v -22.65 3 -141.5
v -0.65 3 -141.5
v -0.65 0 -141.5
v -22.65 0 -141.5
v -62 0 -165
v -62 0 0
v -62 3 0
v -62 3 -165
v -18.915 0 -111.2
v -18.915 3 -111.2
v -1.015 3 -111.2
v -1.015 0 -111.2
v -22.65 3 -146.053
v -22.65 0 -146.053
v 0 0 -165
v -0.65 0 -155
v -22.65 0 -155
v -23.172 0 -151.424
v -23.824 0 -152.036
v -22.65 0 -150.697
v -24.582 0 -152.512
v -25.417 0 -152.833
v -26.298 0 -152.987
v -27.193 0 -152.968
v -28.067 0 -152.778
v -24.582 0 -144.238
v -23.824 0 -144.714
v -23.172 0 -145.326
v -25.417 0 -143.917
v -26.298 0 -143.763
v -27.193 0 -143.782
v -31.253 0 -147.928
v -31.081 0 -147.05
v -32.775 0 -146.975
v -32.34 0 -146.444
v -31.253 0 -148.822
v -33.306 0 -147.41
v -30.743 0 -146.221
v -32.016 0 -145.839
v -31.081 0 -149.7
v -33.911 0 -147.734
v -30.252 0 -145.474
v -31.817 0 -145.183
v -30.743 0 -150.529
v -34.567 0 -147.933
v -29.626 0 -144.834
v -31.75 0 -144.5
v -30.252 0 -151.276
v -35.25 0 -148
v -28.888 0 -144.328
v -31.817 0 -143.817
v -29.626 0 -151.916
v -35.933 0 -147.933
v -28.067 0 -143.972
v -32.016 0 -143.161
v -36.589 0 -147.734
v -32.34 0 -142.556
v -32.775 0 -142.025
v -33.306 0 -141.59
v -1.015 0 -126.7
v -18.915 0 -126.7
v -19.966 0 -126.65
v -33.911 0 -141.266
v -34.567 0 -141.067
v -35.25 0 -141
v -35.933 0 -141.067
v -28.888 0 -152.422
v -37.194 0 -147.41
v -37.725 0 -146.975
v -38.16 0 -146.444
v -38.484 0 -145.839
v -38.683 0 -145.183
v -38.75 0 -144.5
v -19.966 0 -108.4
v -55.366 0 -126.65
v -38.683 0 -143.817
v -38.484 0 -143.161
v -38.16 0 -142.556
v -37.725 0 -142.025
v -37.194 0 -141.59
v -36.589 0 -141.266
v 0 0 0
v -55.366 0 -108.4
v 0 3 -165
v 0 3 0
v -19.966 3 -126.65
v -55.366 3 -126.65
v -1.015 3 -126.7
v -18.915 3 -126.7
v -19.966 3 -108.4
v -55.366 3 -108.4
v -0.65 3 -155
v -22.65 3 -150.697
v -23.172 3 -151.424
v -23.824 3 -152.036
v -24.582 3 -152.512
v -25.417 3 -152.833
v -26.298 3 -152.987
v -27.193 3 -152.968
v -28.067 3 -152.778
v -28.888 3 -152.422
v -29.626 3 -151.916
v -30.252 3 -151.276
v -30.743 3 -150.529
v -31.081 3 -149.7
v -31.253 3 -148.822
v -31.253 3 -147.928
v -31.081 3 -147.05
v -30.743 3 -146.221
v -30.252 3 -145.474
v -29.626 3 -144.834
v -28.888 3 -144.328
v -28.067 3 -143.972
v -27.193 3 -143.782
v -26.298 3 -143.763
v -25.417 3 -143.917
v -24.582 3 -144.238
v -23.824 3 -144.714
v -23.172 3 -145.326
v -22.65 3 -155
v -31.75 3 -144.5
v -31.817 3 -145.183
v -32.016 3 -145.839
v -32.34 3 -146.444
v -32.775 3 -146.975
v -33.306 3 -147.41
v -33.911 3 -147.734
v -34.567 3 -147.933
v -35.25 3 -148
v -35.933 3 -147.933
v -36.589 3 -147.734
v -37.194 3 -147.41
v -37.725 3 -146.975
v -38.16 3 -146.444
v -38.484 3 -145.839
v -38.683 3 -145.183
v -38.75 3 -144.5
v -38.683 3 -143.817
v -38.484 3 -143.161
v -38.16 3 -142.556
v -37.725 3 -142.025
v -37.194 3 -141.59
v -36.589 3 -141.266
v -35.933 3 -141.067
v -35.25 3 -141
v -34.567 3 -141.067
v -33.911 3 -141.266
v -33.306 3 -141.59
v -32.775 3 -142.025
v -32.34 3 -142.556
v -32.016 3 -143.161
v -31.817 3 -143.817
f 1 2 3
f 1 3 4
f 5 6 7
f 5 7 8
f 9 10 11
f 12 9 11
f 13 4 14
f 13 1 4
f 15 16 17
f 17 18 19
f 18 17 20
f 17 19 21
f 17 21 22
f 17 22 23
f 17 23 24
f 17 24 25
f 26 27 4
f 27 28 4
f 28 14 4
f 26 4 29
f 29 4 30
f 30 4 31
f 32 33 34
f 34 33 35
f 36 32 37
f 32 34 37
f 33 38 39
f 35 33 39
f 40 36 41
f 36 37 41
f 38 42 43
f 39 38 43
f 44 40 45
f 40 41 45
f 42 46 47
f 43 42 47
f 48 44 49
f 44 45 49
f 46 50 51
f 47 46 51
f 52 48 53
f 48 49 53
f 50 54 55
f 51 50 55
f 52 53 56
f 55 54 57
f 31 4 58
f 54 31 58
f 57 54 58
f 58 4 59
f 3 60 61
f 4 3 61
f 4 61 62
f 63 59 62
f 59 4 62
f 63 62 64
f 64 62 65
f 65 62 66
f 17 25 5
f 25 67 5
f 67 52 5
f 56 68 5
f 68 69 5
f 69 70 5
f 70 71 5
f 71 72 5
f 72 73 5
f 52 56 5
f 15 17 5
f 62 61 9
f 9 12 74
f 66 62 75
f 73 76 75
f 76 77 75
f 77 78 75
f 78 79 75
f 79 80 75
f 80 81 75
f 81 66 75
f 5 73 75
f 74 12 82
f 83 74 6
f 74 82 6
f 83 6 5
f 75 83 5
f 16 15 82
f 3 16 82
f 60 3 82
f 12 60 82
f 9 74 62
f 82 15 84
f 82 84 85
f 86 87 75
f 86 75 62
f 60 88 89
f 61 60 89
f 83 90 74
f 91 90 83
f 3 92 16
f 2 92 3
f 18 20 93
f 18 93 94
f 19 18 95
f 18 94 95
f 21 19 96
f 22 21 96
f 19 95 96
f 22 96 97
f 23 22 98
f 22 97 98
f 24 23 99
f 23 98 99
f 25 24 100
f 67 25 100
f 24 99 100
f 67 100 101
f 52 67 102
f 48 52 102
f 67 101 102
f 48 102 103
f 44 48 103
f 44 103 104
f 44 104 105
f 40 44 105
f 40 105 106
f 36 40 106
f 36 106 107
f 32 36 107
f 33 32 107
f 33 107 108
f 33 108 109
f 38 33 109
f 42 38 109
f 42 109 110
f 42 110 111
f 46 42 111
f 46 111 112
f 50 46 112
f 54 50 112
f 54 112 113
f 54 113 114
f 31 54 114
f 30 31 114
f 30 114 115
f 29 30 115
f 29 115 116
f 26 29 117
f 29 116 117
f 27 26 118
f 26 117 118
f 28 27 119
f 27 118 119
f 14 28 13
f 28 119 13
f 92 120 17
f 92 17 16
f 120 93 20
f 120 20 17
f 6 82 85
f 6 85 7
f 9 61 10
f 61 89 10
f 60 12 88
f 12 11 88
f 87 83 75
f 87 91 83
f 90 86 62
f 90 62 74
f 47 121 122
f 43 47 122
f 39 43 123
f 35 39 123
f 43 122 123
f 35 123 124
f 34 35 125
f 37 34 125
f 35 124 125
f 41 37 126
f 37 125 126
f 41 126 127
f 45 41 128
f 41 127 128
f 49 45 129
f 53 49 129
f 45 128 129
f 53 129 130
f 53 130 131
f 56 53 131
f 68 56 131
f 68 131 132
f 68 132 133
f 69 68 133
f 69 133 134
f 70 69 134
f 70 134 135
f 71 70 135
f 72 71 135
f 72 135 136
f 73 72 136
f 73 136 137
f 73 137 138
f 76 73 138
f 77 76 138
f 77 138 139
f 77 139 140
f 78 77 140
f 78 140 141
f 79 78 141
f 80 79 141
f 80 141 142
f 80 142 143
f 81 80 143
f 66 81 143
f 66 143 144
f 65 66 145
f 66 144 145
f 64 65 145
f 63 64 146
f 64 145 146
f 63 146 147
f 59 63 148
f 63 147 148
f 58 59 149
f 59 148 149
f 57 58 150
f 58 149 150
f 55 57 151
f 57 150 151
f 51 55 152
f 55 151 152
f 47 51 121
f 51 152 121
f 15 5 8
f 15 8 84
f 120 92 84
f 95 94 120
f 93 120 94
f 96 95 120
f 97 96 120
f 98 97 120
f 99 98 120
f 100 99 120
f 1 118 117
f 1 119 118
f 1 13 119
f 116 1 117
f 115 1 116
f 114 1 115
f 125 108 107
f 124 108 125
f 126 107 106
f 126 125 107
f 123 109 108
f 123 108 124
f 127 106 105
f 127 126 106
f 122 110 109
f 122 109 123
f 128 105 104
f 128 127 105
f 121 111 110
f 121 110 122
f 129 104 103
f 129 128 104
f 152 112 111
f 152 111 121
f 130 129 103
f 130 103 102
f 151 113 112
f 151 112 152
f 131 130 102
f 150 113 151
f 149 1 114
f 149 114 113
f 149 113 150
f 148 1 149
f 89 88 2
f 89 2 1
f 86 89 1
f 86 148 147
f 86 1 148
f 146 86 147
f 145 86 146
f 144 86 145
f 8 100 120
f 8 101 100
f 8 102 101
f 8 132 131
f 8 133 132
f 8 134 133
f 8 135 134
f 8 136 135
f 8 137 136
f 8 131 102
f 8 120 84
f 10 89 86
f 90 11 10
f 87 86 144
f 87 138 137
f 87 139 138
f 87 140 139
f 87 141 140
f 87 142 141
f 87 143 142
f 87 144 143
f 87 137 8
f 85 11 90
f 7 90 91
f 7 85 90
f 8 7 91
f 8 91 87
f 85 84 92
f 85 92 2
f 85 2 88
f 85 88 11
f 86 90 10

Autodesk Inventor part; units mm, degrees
ref_plane "YZ Plane" through (0, 0, 0) normal (1, 0, 0) x (0, 1, 0)
ref_plane "XZ Plane" through (0, 0, 0) normal (0, 1, 0) x (-1, 0, 0)
ref_plane "XY Plane" through (0, 0, 0) normal (0, 0, 1) x (1, 0, 0)
sketch "Sketch1" plane through (0, 0, 0) normal (0, 1, 0) x (-1, 0, 0)
  line L0 (0, 0) -> (62, 0)
  line L1 (62, 0) -> (62, -165)
  line L2 (62, -165) -> (0, -165)
  line L3 (0, -165) -> (0, 0)
  dimension "d0" = 165
  dimension "d1" = 62
extrude "Extrusion1" add sketch "Sketch1" along normal blind 3
sketch "Sketch2" plane through (0, 3, 0) normal (0, 1, 0) x (1, 0, 0)
  line L0 (-62, 165) -> (-62, 0)
  line L1 (3, 165) -> (-127, 165)
  circle A0 centre (-26.65, 148.375) radius 3.125
  line L2 (-18.9147, 111.2) -> (-1.0147, 111.2)
  line L3 (-1.0147, 111.2) -> (-1.0147, 126.7)
  line L4 (-1.0147, 126.7) -> (-18.9147, 126.7)
  line L5 (-18.9147, 126.7) -> (-18.9147, 111.2)
  line L6 (-17.6147, 112.2) -> (-2.3147, 112.2)
  line L7 (-7.804, 125.7) -> (-2.9647, 125.7)
  line L8 (-2.0147, 125.4) -> (-2.0147, 112.5)
  line L9 (-17.9147, 112.5) -> (-17.9147, 125.4)
  line L10 (-19.9657, 108.4) -> (-55.3657, 108.4)
  line L11 (-55.3657, 108.4) -> (-55.3657, 126.65)
  line L12 (-55.3657, 126.65) -> (-19.9657, 126.65)
  line L13 (-19.9657, 126.65) -> (-19.9657, 108.4)
  line L14 (-33.4157, 109.4) -> (-23.5157, 109.4)
  line L15 (-51.8157, 109.4) -> (-41.9157, 109.4)
  line L16 (-54.3657, 123.1) -> (-54.3657, 111.95)
  line L17 (-46.9157, 125.65) -> (-51.8157, 125.65)
  line L18 (-23.5157, 125.65) -> (-28.4157, 125.65)
  line L19 (-20.9657, 111.95) -> (-20.9657, 123.1)
  circle A1 centre (-26.65, 148.375) radius 4.625
  circle A2 centre (-35.25, 144.5) radius 3.5
  circle A3 centre (-35.25, 144.5) radius 2.5
  line L20 (-0.65, 141.5) -> (-22.65, 141.5)
  line L21 (-22.65, 141.5) -> (-22.65, 155)
  line L22 (-22.65, 155) -> (-0.65, 155)
  line L23 (-0.65, 155) -> (-0.65, 141.5)
  line L24 (-21.65, 142) -> (-1.65, 142)
  line L25 (-1.65, 142) -> (-1.65, 153)
  line L26 (-21.65, 153) -> (-1.65, 153)
  line L27 (-21.65, 142) -> (-21.65, 153)
  line L28 (0, 165) -> (-62, 165) projected
  line L29 (-62, 165) -> (-62, 0) projected
  point P0 (-35.25, 147)
  point P1 (-21.65, 147.5)
  point P2 (-22.65, 150.6968)
  point P3 (-22.65, 146.0532)
  dimension "d4" = 1
  dimension "d5" = 1
  dimension "d6" = 1
  dimension "d7" = 1
  dimension "d8" = 1
  dimension "d9" = 1
  dimension "d10" = 1
  dimension "d11" = 1
  dimension "d12" = 1.5
  dimension "d13" = 1
  dimension "d14" = 0.5
  dimension "d15" = 2
  dimension "d16" = 1
  dimension "d17" = 1
  dimension "d18" = 9.25
  dimension "d19" = 7
  dimension "d20" = 39.3
  dimension "d21" = 53.8
  dimension "d22" = 10
  dimension "d23" = 23.5
  dimension "d24" = 39.35
  dimension "d25" = 55.6
  dimension "d26" = 39.35
  dimension "d27" = 55.6
  dimension "d28" = 0.3647
  dimension "d29" = 17.2647
  dimension "d30" = 19.3157
  dimension "d31" = 21
  dimension "d32" = 53.7157
  dimension "d33" = 61.35
  dimension "d36" = 3.65
  dimension "d37" = 39.6
  dimension "d38" = 52.5
  dimension "d39" = 1.6647
  dimension "d40" = 2.3147
  dimension "d41" = 7.154
  dimension "d42" = 16.9647
  dimension "d43" = 39.6
  dimension "d44" = 52.5
  dimension "d45" = 41.9
  dimension "d46" = 53.05
  dimension "d47" = 22.8657
  dimension "d48" = 22.8657
  dimension "d49" = 26
  dimension "d50" = 27.7657
  dimension "d51" = 32.7657
  dimension "d52" = 18
  dimension "d53" = 34.6
  dimension "d54" = 34.6
  dimension "d55" = 41.2657
  dimension "d56" = 46.2657
  dimension "d57" = 51.1657
  dimension "d58" = 51.1657
  dimension "d59" = 41.9
  dimension "d60" = 53.05
  dimension "d61" = 0
  dimension "d62" = 165
  dimension "d63" = 126.35
extrude "Extrusion2" cut sketch "Sketch2" against normal through all contours A0 | L5 L4 L3 L2 | L10 L11 L12 L13 | A1 L21 | A1 L21 L22 L23 L20 | L21 A1 | A2 | A3 | L27 L26 L25 L24
properties part number "acrylicBackPanel"
